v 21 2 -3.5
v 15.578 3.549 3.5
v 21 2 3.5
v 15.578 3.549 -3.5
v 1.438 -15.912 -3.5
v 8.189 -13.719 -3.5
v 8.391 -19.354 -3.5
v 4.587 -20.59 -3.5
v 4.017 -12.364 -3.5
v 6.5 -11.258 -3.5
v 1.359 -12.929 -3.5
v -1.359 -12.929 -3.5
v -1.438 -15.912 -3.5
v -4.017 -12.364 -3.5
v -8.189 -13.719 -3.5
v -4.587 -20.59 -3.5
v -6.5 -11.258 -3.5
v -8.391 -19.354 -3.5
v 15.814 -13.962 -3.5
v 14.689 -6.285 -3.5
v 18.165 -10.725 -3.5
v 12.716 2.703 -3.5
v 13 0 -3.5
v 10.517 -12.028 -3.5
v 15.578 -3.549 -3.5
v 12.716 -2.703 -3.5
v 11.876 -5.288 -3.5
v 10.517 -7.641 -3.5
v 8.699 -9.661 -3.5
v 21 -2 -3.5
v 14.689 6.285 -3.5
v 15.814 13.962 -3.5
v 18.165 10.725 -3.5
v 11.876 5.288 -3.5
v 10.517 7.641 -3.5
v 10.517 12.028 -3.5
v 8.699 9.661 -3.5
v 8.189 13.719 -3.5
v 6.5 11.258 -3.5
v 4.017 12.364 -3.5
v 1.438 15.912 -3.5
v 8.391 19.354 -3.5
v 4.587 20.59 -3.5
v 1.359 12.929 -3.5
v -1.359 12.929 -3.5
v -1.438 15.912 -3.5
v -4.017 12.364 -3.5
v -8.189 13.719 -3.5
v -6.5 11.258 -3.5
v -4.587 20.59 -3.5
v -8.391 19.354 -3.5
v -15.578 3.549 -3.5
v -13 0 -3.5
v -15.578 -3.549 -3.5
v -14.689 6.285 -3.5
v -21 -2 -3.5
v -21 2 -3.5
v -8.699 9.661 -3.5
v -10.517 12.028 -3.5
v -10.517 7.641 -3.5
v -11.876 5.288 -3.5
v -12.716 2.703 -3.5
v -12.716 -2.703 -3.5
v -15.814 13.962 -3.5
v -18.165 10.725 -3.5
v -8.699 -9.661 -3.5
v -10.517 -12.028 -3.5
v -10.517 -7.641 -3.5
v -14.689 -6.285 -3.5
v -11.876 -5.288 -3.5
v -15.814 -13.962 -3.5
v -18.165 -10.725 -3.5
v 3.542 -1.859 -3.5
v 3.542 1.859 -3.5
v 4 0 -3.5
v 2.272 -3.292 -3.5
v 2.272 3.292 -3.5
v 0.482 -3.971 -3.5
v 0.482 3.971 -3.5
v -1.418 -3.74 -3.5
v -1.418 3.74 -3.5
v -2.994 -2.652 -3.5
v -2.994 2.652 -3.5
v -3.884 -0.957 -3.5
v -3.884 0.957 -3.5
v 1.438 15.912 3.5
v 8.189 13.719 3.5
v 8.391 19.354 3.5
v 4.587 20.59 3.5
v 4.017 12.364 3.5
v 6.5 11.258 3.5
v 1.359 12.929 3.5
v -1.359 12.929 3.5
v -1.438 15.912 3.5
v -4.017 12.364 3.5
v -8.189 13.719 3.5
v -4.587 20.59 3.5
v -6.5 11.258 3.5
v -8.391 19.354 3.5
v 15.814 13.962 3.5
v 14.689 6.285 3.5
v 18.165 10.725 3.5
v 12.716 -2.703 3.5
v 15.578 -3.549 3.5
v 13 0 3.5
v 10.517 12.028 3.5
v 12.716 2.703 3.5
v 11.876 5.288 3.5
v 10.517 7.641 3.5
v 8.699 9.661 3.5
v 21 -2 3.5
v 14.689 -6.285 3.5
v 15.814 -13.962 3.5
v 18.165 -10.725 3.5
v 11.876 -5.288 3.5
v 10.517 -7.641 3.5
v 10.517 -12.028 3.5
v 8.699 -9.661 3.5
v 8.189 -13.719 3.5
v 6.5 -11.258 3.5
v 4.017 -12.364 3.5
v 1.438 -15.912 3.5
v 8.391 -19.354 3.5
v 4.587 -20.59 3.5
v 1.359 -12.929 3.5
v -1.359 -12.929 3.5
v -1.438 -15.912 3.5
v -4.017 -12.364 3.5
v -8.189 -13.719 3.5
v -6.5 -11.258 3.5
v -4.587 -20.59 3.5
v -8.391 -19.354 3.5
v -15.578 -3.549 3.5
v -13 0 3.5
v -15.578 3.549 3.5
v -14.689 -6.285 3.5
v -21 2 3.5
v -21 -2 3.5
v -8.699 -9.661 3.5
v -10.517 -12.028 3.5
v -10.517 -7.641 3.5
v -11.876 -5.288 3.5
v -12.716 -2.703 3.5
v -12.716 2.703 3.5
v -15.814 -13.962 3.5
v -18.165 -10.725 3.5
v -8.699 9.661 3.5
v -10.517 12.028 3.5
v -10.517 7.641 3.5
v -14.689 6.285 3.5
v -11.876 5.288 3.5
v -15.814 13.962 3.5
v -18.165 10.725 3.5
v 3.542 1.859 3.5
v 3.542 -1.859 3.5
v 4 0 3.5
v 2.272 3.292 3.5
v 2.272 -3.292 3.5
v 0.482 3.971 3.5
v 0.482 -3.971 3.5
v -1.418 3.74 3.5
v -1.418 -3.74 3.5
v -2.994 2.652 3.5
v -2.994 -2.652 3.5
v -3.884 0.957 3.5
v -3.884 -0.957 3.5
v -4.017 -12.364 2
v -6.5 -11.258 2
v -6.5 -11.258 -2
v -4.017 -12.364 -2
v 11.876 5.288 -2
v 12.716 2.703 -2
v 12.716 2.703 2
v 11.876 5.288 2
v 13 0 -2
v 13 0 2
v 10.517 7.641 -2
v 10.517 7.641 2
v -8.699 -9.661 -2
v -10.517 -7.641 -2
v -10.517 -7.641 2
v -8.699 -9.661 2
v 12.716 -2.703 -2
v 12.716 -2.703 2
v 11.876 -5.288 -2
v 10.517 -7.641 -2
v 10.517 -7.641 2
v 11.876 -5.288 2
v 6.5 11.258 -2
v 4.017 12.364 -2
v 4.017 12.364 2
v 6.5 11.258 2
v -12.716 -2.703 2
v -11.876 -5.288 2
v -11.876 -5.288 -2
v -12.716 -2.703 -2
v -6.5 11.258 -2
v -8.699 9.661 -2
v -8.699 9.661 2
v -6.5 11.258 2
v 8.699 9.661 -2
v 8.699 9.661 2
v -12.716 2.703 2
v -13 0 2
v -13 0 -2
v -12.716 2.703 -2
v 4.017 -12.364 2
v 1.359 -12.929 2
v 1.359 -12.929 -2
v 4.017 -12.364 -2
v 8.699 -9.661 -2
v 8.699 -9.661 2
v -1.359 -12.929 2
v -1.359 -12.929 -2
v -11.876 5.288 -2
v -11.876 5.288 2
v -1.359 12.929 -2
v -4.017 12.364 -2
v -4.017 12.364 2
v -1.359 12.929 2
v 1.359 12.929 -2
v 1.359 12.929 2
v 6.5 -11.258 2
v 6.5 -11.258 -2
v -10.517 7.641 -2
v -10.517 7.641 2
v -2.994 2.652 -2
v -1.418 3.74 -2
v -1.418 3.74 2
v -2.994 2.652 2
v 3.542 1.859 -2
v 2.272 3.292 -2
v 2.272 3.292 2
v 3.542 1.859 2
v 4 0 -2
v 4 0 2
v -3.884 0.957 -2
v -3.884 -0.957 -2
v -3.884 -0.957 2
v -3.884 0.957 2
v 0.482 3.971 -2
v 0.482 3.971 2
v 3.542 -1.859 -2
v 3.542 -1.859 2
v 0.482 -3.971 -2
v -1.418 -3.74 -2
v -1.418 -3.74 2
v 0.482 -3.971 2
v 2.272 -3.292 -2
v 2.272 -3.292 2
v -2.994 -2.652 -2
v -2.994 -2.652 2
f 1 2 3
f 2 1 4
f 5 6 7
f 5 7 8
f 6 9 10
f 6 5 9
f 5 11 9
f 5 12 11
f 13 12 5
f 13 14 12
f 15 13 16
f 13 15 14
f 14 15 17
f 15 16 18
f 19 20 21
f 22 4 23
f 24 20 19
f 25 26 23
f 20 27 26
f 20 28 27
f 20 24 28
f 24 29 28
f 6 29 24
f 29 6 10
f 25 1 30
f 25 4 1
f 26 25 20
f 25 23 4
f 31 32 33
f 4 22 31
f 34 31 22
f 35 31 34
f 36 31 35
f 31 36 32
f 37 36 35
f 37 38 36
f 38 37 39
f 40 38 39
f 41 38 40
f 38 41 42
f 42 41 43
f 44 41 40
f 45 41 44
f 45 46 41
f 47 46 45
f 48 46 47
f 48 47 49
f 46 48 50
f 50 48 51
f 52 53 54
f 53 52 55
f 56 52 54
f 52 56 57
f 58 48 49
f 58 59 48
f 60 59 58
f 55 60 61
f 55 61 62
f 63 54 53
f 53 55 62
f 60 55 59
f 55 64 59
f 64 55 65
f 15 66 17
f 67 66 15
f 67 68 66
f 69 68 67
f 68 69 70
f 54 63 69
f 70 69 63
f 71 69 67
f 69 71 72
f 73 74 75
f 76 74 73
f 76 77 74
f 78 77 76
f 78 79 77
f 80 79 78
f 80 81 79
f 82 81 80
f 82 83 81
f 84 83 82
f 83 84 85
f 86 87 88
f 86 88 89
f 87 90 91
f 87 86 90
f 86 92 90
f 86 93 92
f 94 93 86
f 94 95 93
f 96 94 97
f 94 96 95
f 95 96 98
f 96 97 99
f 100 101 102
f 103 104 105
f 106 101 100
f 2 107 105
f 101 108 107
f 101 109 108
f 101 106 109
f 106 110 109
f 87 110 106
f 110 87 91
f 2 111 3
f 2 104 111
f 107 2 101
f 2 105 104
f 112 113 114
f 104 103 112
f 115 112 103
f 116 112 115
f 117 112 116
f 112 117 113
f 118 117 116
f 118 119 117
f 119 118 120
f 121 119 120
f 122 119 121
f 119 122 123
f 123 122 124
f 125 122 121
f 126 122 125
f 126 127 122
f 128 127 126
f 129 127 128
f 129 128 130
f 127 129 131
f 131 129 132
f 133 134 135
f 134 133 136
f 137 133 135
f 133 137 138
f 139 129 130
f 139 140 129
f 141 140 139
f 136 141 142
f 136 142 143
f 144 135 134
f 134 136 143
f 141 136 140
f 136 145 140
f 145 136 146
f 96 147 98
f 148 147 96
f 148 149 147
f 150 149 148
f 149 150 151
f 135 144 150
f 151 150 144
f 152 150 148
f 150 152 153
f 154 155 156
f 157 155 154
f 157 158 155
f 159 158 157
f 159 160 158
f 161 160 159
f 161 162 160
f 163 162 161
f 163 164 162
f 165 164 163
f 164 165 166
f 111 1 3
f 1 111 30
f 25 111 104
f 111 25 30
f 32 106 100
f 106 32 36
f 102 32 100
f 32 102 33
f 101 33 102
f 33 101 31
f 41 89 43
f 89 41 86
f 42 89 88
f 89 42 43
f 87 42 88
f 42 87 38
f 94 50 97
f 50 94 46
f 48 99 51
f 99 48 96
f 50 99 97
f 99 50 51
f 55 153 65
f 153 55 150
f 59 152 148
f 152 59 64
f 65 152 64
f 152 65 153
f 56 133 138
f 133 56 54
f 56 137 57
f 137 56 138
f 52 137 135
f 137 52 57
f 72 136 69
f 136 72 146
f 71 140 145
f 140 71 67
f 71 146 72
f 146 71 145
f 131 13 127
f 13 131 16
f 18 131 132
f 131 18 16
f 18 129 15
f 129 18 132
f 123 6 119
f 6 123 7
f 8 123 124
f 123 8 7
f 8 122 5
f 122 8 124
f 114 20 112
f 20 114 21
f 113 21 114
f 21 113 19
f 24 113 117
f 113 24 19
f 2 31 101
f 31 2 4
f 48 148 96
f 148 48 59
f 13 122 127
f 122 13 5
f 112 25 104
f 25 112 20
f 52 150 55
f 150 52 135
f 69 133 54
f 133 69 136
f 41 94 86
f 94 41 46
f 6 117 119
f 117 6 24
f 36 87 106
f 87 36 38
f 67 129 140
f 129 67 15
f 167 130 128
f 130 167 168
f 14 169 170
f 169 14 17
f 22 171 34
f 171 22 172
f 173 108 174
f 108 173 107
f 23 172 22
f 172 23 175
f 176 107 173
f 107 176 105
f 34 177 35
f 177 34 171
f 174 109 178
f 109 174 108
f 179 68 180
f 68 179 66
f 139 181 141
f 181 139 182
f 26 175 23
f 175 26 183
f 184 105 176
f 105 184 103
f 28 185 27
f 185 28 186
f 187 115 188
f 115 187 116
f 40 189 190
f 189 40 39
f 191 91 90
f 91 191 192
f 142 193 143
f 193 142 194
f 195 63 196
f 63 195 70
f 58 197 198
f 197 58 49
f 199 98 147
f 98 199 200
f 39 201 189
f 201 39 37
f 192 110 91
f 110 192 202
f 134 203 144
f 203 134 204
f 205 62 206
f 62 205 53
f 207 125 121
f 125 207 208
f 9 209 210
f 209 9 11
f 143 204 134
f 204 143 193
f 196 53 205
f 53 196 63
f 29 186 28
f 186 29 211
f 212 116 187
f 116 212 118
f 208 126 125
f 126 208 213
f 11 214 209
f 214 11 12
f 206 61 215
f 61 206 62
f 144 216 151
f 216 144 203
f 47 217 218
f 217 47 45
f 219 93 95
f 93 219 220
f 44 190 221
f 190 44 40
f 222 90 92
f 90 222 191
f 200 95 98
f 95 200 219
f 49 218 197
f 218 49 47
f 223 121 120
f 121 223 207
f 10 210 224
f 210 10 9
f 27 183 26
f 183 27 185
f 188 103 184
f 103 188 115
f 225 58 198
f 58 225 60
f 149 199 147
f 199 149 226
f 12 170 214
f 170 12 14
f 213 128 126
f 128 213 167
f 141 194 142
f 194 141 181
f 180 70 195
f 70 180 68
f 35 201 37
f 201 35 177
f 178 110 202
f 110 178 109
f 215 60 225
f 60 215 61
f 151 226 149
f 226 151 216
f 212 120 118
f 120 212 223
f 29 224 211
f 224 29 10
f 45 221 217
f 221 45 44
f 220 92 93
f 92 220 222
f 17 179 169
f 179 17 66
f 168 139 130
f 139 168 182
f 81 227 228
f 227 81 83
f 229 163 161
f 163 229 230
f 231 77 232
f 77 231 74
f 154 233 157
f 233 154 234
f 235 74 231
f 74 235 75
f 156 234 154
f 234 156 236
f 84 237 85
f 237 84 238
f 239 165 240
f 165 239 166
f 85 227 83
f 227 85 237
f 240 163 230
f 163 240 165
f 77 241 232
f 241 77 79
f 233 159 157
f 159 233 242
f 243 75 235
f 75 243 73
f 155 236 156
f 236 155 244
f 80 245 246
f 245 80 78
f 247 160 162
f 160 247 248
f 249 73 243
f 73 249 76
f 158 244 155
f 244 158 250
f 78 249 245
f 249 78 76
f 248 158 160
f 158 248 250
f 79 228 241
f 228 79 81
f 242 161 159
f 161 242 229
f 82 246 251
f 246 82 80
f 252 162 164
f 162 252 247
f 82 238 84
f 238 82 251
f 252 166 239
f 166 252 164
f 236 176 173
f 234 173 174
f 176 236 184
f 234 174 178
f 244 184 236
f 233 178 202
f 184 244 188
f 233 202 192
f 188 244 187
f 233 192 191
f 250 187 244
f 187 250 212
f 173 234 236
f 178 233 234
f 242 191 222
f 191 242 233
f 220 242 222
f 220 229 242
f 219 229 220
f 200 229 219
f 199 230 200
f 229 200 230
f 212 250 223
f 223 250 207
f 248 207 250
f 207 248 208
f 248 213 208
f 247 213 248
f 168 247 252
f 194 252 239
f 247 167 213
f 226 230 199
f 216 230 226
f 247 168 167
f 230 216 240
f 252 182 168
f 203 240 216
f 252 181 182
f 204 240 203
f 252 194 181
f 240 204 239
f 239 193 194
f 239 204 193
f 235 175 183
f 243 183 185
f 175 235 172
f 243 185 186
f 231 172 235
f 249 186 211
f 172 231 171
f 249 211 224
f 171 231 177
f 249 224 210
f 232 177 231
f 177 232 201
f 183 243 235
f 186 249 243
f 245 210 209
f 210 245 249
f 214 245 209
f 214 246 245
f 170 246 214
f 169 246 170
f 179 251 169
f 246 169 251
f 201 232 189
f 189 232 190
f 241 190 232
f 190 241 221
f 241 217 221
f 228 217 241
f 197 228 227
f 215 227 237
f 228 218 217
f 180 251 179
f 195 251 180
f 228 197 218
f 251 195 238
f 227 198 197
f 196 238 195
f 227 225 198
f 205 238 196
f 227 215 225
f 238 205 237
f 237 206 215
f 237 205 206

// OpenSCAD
module Gear_01(){

color("#a8b0b2")
union(){
cylinder(7,16,16,$fn=30,center= true);

for (i=[0:45:359]) {
    r = 14; // pattern radius
    n = 10; // number of cars
step = 360/n;
for (i=[0:step:359]) {
    angle = i;
    dx = r*cos(angle);
    dy = r*sin(angle);
    translate([dx,dy,0])
    rotate([0,0,angle])  
    {
 
  
// #linear_extrude(7, scale = 1, center = true)
linear_extrude(7, scale = 1, center = true)
polygon(points=[[0,-4],[7,-2],[7,2],[0,4]]);
     
}    
 
}
}

}

/*
color("blue"){
translate([14,0,0])
%linear_extrude(8, scale = 1, center = true)
polygon(points=[[0,-4],[7,-2],[7,2],[0,4]]);
}
*/

}


difference(){
Gear_01();
color("#777777")
difference(){
cylinder(15,13,13, center = true);
cylinder(15,4,4, center = true);

}
}
color("#777777")
cylinder(4,13,13, center = true);
